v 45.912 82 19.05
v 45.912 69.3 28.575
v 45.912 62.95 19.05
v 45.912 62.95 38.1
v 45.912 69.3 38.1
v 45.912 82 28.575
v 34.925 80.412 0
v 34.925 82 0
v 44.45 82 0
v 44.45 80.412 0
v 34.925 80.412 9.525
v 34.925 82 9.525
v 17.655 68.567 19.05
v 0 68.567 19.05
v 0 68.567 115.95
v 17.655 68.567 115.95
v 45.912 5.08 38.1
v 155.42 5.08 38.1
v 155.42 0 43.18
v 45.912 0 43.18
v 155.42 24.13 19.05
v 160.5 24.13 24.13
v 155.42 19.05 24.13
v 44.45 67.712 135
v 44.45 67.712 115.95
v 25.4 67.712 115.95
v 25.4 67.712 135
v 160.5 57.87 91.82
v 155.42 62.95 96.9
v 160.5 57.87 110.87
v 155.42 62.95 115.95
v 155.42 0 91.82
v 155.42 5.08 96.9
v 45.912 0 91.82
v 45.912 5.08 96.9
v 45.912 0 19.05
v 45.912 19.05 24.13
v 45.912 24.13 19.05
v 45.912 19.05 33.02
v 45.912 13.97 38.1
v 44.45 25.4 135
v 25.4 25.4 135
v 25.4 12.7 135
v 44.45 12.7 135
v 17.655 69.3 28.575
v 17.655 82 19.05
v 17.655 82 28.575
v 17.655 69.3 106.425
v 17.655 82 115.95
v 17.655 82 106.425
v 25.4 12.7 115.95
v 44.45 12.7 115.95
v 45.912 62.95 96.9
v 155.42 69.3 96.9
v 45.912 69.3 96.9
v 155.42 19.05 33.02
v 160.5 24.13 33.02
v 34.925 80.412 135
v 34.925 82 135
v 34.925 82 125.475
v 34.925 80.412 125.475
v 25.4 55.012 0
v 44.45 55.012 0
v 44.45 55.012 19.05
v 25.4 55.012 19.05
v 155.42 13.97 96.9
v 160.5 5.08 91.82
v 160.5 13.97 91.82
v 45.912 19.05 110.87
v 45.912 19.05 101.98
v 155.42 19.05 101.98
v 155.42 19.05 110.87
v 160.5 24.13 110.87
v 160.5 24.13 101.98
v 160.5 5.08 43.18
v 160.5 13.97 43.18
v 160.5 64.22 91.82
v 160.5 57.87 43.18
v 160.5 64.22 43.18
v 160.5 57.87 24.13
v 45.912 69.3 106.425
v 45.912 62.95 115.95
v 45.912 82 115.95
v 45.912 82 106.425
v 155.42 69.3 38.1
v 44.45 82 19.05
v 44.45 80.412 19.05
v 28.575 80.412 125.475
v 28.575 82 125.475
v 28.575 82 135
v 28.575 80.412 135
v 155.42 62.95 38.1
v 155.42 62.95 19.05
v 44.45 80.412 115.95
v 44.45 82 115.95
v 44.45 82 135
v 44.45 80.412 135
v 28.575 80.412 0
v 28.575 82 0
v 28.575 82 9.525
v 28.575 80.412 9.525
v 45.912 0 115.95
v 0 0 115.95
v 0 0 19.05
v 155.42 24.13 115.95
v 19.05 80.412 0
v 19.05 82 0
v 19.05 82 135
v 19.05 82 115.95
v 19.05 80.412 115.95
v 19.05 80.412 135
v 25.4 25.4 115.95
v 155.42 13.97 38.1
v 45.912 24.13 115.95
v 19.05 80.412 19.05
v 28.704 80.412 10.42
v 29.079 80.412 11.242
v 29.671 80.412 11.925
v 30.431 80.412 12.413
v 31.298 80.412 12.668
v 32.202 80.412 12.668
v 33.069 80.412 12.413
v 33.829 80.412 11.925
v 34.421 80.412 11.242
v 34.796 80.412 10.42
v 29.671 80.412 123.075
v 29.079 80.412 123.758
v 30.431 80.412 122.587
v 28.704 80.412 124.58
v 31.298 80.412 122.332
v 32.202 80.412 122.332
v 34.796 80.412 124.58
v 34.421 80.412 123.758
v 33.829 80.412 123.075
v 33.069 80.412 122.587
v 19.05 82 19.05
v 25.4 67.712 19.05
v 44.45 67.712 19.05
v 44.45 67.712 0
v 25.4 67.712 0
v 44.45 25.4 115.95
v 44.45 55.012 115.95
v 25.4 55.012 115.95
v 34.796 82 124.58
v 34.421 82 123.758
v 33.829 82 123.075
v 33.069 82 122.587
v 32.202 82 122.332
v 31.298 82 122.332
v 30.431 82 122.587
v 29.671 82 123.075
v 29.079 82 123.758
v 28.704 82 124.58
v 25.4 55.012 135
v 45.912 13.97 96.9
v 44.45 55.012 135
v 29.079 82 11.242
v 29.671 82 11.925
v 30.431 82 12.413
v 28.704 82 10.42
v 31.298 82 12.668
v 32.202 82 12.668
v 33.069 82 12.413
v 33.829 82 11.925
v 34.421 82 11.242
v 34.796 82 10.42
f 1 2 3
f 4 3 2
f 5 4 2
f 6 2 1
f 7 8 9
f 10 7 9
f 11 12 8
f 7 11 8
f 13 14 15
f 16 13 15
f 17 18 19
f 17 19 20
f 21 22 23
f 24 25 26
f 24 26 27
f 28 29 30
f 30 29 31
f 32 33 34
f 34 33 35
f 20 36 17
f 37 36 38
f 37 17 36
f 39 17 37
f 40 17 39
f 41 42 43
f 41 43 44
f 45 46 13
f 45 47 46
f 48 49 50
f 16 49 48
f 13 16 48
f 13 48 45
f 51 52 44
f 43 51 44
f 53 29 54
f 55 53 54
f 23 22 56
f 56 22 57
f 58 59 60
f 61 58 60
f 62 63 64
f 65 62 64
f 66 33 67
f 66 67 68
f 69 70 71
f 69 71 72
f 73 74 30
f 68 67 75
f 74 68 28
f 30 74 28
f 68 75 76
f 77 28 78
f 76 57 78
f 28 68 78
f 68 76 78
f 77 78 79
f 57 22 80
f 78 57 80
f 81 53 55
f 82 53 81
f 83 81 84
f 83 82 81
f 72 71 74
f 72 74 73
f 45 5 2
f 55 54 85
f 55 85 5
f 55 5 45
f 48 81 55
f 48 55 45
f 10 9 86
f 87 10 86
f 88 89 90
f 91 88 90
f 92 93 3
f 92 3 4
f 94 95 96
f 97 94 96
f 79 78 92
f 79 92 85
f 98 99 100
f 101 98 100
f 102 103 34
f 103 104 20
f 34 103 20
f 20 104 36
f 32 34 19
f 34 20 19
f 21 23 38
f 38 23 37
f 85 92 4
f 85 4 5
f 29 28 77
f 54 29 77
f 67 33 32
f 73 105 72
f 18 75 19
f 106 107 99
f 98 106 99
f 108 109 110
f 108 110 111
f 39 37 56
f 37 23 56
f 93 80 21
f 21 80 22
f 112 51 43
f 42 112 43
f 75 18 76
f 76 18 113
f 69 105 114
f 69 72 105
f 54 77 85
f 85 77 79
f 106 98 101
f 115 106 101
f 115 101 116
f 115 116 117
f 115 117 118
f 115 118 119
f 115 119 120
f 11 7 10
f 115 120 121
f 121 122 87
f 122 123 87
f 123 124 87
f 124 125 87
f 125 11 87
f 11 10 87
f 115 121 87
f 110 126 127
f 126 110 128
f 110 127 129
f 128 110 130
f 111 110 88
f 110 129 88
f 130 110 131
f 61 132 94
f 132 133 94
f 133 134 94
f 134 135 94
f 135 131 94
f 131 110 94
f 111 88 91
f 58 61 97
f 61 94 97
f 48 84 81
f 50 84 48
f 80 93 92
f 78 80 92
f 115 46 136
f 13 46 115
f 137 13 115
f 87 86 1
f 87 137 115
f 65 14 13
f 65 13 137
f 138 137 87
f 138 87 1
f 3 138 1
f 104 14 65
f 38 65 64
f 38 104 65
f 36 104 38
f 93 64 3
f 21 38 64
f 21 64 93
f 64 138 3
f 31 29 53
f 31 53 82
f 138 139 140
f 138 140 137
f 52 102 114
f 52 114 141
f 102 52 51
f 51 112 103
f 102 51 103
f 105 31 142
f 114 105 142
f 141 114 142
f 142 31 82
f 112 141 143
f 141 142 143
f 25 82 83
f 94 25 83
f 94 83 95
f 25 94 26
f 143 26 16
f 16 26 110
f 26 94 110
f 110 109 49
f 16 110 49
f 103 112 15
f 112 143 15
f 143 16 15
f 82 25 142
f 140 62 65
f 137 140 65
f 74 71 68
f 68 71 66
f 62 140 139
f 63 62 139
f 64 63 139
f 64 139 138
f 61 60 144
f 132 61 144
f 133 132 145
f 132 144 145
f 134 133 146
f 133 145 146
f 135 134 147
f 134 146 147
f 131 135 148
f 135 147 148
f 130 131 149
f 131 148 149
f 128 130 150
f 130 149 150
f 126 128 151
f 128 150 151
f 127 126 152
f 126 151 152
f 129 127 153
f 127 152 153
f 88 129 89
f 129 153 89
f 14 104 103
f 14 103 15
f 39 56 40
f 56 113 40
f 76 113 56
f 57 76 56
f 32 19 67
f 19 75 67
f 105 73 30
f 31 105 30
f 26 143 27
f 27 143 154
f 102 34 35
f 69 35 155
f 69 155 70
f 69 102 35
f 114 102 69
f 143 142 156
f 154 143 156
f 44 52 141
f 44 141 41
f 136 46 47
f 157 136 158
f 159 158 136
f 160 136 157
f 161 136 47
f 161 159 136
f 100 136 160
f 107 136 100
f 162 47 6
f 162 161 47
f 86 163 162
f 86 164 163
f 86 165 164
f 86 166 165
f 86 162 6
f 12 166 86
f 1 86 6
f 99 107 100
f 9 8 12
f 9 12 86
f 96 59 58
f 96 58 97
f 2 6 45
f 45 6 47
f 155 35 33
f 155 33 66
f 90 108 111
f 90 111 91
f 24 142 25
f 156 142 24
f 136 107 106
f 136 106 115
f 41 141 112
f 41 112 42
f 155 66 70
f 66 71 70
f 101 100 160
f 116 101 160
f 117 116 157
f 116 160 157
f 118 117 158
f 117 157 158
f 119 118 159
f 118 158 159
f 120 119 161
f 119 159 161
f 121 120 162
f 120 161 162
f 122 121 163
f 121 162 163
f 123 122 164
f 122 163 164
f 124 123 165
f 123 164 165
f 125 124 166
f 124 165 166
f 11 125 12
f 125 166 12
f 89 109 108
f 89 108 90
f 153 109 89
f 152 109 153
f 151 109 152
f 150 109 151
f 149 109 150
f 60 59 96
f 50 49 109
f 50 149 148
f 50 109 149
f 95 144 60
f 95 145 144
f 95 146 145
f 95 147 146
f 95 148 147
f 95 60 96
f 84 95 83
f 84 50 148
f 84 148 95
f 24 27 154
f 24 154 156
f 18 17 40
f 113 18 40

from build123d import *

# Parameters (mm, degrees)
F0_W      = 160.5
F0_H      = 82
F1_DEPTH  = 135
F2_W      = 12.7
F2_H      = 19.05
F2_W_2    = 29.6125
F2_W_3    = 55.0125
F3_DEPTH  = 160.501
F4_W      = 116.05
F4_H      = 19.05
F4_W_2    = 19.05
F4_W_3    = 160.5
F4_H_2    = 38.925
F5_DEPTH  = 12.7
F6_W      = 25.4
F6_H      = 19.05
F6_W_2    = 116.05
F7_DEPTH  = 74.34175
F8_W      = 19.05
F8_H      = 19.05
F9_DEPTH  = 114.58845
F10_SIZE  = 5.08
F11_W     = 28.7067964673
F11_H     = 142.8163200617
F12_DEPTH = 17.65534


with BuildPart() as f1:
    # F0 (on Top) → F1 (new body)
    with BuildSketch(Plane.XY):
        with Locations((80.25, 41)):
            Rectangle(F0_W, F0_H)
    extrude(amount=F1_DEPTH)

    # F2 (on face) → F3 (cut, through all)
    with BuildSketch(Plane.YZ.offset(160.5)):
        with Locations((6.35, 125.475)):
            Rectangle(F2_W, F2_H)
        with Locations((40.20625, 125.475)):
            Rectangle(F2_W_2, F2_H)
        with Locations((74.0625, 125.475)):
            Rectangle(F2_W, F2_H)
        with Locations((74.0625, 9.525)):
            Rectangle(F2_W, F2_H)
        with Locations((27.50625, 9.525)):
            Rectangle(F2_W_3, F2_H)
    extrude(amount=-F3_DEPTH, mode=Mode.SUBTRACT)

    # F4 (on face) → F5 (cut)
    with BuildSketch(Plane(origin=(0, 82, 0), x_dir=(-1, 0, 0), z_dir=(0, 1, 0))):
        with Locations((-102.475, 125.475)):
            Rectangle(F4_W, F4_H)
        with Locations((-9.525, 125.475)):
            Rectangle(F4_W_2, F4_H)
        with Locations((-80.25, 86.9625)):
            Rectangle(F4_W_3, F4_H_2)
        with Locations((-80.25, 48.0375)):
            Rectangle(F4_W_3, F4_H_2)
        with BuildLine():
            Line((-28.575, 135), (-34.925, 135))
            Line((-34.925, 135), (-34.925, 125.475))
            ThreePointArc((-34.925, 125.475), (-31.75, 122.3), (-28.575, 125.475))
            Line((-28.575, 125.475), (-28.575, 135))
        make_face()
        with BuildLine():
            ThreePointArc((-28.575, 9.525), (-31.75, 12.7), (-34.925, 9.525))
            Line((-34.925, 9.525), (-34.925, 0))
            Line((-34.925, 0), (-28.575, 0))
            Line((-28.575, 0), (-28.575, 9.525))
        make_face()
        with Locations((-102.475, 9.525)):
            Rectangle(F4_W, F4_H)
        with Locations((-9.525, 9.525)):
            Rectangle(F4_W_2, F4_H)
    extrude(amount=-F5_DEPTH, mode=Mode.SUBTRACT)

    # F6 (on face) → F7 (cut)
    with BuildSketch(Plane.XZ):
        with Locations((12.7, 125.475)):
            Rectangle(F6_W, F6_H)
        with Locations((102.475, 125.475)):
            Rectangle(F6_W_2, F6_H)
        with Locations((12.7, 9.525)):
            Rectangle(F6_W, F6_H)
        with Locations((102.475, 9.525)):
            Rectangle(F6_W_2, F6_H)
    extrude(amount=-F7_DEPTH, mode=Mode.SUBTRACT)

    # F8 (on face) → F9 (cut)
    with BuildSketch(Plane.YZ.offset(160.5)):
        with Locations((9.525, 106.425)):
            Rectangle(F8_W, F8_H)
        with Locations((72.475, 106.425)):
            Rectangle(F8_W, F8_H)
        with Locations((72.475, 28.575)):
            Rectangle(F8_W, F8_H)
        with Locations((9.525, 28.575)):
            Rectangle(F8_W, F8_H)
    extrude(amount=-F9_DEPTH, mode=Mode.SUBTRACT)

    # F10
    f10_edges = [f1.edges().sort_by_distance(p)[0] for p in [
        (103.205775, 19.05, 96.9),
        (103.205775, 0, 96.9),
        (103.205775, 19.05, 115.95),
        (160.5, 41, 115.95),
        (160.5, 62.95, 28.575),
        (160.5, 66.125, 38.1),
        (160.5, 69.3, 67.5),
        (160.5, 66.125, 96.9),
        (160.5, 62.95, 106.425),
        (160.5, 19.05, 106.425),
        (160.5, 9.525, 96.9),
        (160.5, 0, 67.5),
        (160.5, 9.525, 38.1),
        (160.5, 19.05, 28.575),
        (160.5, 41, 19.05),
        (103.205775, 19.05, 38.1),
        (103.205775, 0, 38.1),
        (103.205775, 19.05, 19.05),
    ]]
    chamfer(f10_edges, length=F10_SIZE)

    # F11 (on face) → F12 (cut)
    with BuildSketch(Plane(origin=(0, 0, 0), x_dir=(0, -1, 0), z_dir=(-1, 0, 0))):
        with Locations((-82.9201973975, 60.9774813056)):
            Rectangle(F11_W, F11_H)
    extrude(amount=-F12_DEPTH, mode=Mode.SUBTRACT)


solid = f1.part
